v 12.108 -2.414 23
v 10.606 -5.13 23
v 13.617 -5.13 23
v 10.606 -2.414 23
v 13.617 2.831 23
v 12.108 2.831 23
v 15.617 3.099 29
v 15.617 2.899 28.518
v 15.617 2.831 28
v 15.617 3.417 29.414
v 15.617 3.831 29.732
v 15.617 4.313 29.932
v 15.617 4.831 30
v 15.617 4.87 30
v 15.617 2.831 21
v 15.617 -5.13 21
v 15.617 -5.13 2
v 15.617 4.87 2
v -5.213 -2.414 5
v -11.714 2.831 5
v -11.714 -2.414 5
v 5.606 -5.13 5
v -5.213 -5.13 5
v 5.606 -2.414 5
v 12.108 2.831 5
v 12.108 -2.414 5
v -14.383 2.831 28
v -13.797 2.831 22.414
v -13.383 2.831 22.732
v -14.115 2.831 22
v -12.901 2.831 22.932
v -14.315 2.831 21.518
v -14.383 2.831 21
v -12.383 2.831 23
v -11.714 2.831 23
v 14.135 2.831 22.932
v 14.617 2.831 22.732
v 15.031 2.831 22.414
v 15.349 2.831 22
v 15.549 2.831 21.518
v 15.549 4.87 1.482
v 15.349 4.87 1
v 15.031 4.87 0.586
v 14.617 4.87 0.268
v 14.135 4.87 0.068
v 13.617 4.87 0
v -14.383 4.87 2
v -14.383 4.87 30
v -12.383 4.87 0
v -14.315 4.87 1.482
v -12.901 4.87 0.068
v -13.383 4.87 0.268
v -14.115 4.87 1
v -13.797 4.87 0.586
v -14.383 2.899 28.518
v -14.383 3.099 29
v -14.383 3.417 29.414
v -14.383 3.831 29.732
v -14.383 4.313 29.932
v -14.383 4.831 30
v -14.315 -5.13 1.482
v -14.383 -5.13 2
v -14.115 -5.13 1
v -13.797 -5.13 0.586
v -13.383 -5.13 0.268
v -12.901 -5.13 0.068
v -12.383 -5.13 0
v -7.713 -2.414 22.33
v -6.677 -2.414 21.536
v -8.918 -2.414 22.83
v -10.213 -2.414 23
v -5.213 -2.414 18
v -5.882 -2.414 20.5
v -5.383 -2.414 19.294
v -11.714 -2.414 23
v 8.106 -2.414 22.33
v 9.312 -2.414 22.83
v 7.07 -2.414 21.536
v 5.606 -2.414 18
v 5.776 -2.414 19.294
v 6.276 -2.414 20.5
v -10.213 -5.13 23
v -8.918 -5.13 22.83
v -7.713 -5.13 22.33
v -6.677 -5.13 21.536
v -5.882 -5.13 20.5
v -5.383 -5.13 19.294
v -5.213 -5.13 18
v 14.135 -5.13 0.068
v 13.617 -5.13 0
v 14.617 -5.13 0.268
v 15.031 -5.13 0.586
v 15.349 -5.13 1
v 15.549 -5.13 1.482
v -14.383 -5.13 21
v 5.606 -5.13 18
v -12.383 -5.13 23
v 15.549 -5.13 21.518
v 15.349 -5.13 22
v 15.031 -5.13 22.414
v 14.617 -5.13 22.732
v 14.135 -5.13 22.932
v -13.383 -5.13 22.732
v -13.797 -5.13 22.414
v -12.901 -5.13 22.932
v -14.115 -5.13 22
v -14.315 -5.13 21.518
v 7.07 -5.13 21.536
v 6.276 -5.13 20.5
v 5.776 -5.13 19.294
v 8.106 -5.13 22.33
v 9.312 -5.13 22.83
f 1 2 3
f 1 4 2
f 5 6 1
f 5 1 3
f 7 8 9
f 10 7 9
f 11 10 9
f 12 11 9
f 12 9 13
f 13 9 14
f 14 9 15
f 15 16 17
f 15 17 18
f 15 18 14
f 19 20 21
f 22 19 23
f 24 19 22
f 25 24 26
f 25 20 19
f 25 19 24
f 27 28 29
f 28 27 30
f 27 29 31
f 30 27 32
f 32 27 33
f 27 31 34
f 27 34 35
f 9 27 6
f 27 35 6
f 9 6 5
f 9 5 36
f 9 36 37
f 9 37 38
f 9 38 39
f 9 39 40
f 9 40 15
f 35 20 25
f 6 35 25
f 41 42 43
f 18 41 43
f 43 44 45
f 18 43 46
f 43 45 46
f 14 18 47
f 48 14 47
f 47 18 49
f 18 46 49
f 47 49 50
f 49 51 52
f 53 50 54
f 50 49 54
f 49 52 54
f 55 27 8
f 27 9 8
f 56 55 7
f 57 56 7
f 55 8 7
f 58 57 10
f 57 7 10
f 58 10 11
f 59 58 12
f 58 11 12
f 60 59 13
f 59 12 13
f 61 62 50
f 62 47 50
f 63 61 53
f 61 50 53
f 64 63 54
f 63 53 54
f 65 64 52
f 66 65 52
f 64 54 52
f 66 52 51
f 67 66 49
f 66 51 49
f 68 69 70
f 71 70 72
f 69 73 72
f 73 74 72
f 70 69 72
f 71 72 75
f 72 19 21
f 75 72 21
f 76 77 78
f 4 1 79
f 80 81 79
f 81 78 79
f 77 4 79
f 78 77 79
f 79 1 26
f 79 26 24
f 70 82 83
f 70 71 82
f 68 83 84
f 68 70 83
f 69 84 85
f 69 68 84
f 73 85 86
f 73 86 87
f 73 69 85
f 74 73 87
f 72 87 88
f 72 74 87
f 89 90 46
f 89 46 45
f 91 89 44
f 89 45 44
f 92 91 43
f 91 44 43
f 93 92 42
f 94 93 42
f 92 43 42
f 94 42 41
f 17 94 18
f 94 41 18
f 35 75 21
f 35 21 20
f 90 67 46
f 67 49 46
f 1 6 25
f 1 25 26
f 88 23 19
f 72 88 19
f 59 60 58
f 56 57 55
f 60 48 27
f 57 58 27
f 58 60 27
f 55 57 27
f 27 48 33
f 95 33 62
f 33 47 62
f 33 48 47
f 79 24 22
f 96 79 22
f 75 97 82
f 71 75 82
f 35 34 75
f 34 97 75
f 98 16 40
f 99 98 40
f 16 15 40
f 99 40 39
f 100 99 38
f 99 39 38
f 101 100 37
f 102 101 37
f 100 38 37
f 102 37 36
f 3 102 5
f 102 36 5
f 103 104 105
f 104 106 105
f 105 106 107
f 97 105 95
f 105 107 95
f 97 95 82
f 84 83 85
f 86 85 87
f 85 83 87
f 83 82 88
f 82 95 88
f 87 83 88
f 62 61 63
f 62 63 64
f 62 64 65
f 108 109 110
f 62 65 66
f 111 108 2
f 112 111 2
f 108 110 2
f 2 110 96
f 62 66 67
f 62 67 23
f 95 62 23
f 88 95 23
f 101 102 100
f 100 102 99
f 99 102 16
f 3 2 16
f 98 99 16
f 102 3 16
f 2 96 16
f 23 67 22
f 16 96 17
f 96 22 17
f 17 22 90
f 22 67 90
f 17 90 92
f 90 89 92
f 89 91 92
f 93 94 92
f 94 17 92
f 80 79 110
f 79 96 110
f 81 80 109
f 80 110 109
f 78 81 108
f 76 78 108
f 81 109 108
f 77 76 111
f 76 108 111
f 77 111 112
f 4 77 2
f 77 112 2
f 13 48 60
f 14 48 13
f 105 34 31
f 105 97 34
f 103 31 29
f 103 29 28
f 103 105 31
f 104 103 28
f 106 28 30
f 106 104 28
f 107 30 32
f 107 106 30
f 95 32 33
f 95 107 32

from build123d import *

# Parameters (mm, degrees)
F0_W     = 30
F0_H     = 10
F1_DEPTH = 5
F3_DEPTH = 25
F4_DEPTH = 18
F5_R     = 5
F6_R     = 2


with BuildPart() as f1:
    # F0 (on Top) → F1 (new body)
    with BuildSketch(Plane.XY):
        with Locations((0.6170257553, -0.1298129745)):
            Rectangle(F0_W, F0_H)
    extrude(amount=F1_DEPTH)

    # F2 (on face) → F3 (join)
    with BuildSketch(Plane.XY.offset(5)):
        Polygon((15.6170257553, 4.8701870255), (-14.3829742447, 4.8701870255), (-14.3829742447, 2.8308965266), (-11.7144621909, 2.8308965266), (12.1078416705, 2.8308965266), (15.6170257553, 2.8308965266), align=None)
    extrude(amount=F3_DEPTH)

    # F2 (on face) → F4 (join)
    with BuildSketch(Plane.XY.offset(5)):
        Polygon((-11.7144621909, 2.8308965266), (-14.3829742447, 2.8308965266), (-14.3829742447, -5.1298129745), (-5.2125030197, -5.1298129745), (-5.2125030197, -2.4143811315), (-11.7144621909, -2.4143811315), align=None)
        Polygon((15.6170257553, -5.1298129745), (15.6170257553, 2.8308965266), (12.1078416705, 2.8308965266), (12.1078416705, -2.4143811315), (5.6058824994, -2.4143811315), (5.6058824994, -5.1298129745), align=None)
    extrude(amount=F4_DEPTH)

    # F5
    f5_edges = [f1.edges().sort_by_distance(p)[0] for p in [
        (-5.212503, -3.772097, 23),
        (5.605882, -3.772097, 23),
    ]]
    fillet(f5_edges, radius=F5_R)

    # F6
    f6_edges = [f1.edges().sort_by_distance(p)[0] for p in [
        (0.617026, 2.830897, 30),
        (15.617026, -0.129813, 0),
        (15.617026, -1.149458, 23),
        (-14.382974, -1.149458, 23),
        (-14.382974, -0.129813, 0),
    ]]
    fillet(f6_edges, radius=F6_R)


solid = f1.part
